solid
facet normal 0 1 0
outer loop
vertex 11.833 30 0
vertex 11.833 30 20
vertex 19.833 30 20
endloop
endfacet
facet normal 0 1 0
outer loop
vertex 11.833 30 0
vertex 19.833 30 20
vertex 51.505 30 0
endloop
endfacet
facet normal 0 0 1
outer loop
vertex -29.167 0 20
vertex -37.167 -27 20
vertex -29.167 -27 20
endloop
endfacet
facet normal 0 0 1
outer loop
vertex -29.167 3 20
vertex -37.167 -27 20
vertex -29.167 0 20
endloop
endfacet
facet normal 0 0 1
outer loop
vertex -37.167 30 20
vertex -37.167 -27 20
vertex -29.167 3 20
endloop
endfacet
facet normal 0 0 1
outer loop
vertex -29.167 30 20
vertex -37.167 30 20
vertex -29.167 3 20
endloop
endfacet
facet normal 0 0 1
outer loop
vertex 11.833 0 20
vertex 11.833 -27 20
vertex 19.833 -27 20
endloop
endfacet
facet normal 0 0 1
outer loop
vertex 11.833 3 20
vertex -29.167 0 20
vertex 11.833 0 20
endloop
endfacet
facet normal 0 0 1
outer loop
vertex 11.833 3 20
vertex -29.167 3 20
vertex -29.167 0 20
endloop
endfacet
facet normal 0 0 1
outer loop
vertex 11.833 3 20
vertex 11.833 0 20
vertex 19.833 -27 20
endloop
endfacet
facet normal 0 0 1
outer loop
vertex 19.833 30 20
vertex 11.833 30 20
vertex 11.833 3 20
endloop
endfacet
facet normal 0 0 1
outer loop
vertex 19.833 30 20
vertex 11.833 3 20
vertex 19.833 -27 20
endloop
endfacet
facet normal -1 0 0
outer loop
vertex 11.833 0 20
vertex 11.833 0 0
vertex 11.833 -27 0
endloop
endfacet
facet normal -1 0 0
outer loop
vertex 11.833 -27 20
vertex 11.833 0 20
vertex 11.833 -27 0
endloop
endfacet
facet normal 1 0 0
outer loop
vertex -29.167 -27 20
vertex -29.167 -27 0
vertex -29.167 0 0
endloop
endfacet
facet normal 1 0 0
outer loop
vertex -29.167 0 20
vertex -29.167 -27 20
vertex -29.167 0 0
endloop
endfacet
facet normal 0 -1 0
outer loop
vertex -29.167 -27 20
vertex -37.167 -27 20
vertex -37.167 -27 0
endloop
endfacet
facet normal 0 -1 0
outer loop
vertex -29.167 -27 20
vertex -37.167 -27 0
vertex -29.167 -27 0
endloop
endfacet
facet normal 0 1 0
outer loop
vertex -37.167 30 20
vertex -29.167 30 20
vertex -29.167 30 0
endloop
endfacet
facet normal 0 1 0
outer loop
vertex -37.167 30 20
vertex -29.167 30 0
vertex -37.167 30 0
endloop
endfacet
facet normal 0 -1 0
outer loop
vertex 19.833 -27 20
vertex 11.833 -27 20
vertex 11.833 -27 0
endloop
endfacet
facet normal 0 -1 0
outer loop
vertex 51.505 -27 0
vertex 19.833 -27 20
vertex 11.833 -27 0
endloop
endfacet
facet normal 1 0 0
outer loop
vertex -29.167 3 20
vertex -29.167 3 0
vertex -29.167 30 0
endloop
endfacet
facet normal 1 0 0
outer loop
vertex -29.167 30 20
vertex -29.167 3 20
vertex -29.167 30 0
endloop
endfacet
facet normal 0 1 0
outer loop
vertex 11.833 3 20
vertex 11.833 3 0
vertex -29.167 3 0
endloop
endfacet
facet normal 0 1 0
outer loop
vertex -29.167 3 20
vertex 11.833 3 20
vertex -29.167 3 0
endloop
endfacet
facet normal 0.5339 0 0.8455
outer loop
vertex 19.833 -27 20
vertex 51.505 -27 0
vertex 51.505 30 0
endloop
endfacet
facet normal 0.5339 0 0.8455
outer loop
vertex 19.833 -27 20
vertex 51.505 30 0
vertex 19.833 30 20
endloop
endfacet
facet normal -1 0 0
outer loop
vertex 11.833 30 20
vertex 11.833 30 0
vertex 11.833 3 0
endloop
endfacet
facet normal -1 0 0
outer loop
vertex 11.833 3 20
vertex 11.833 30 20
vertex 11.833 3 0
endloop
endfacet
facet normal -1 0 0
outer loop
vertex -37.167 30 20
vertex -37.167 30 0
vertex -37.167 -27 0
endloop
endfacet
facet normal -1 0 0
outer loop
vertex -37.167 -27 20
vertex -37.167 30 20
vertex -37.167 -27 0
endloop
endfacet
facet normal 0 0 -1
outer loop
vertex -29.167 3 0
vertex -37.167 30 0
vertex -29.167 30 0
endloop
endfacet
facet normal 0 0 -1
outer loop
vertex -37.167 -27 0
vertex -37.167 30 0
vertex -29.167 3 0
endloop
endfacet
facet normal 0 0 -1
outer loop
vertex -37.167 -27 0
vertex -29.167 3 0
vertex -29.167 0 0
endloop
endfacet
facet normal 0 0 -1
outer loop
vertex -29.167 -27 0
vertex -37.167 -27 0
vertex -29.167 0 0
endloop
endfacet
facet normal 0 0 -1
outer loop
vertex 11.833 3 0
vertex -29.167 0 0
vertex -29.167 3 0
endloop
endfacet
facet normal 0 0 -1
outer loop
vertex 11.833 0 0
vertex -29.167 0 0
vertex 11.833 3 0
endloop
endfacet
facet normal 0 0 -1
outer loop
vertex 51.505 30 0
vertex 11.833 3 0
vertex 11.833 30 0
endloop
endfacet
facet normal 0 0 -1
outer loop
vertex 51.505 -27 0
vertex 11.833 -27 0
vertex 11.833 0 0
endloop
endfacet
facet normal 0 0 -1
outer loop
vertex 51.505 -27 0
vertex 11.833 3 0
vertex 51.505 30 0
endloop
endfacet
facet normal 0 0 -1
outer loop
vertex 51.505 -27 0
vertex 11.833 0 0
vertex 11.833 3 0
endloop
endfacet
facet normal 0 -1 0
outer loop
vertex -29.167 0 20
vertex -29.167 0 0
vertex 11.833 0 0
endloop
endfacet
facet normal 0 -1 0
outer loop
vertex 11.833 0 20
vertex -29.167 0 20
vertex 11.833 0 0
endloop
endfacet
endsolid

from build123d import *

# Parameters (mm, degrees)
F1_DEPTH = 20
F3_DEPTH = 57


with BuildPart() as f1:
    # F0 (on Top) → F1 (new body)
    with BuildSketch(Plane.XY):
        Polygon((-29.166666, 30), (-37.166666, 30), (-37.166666, -27), (-29.166666, -27), (-29.166666, 0), (11.833334, 0), (11.833334, -27), (19.833334, -27), (19.833334, 30), (11.833334, 30), (11.833334, 3), (-29.166666, 3), align=None)
    extrude(amount=F1_DEPTH)

    # F2 (on face) → F3 (join)
    with BuildSketch(Plane.XZ.offset(27)):
        Polygon((19.833334, 20), (19.833334, 0), (51.504664, 0), align=None)
    extrude(amount=-F3_DEPTH)


solid = f1.part
